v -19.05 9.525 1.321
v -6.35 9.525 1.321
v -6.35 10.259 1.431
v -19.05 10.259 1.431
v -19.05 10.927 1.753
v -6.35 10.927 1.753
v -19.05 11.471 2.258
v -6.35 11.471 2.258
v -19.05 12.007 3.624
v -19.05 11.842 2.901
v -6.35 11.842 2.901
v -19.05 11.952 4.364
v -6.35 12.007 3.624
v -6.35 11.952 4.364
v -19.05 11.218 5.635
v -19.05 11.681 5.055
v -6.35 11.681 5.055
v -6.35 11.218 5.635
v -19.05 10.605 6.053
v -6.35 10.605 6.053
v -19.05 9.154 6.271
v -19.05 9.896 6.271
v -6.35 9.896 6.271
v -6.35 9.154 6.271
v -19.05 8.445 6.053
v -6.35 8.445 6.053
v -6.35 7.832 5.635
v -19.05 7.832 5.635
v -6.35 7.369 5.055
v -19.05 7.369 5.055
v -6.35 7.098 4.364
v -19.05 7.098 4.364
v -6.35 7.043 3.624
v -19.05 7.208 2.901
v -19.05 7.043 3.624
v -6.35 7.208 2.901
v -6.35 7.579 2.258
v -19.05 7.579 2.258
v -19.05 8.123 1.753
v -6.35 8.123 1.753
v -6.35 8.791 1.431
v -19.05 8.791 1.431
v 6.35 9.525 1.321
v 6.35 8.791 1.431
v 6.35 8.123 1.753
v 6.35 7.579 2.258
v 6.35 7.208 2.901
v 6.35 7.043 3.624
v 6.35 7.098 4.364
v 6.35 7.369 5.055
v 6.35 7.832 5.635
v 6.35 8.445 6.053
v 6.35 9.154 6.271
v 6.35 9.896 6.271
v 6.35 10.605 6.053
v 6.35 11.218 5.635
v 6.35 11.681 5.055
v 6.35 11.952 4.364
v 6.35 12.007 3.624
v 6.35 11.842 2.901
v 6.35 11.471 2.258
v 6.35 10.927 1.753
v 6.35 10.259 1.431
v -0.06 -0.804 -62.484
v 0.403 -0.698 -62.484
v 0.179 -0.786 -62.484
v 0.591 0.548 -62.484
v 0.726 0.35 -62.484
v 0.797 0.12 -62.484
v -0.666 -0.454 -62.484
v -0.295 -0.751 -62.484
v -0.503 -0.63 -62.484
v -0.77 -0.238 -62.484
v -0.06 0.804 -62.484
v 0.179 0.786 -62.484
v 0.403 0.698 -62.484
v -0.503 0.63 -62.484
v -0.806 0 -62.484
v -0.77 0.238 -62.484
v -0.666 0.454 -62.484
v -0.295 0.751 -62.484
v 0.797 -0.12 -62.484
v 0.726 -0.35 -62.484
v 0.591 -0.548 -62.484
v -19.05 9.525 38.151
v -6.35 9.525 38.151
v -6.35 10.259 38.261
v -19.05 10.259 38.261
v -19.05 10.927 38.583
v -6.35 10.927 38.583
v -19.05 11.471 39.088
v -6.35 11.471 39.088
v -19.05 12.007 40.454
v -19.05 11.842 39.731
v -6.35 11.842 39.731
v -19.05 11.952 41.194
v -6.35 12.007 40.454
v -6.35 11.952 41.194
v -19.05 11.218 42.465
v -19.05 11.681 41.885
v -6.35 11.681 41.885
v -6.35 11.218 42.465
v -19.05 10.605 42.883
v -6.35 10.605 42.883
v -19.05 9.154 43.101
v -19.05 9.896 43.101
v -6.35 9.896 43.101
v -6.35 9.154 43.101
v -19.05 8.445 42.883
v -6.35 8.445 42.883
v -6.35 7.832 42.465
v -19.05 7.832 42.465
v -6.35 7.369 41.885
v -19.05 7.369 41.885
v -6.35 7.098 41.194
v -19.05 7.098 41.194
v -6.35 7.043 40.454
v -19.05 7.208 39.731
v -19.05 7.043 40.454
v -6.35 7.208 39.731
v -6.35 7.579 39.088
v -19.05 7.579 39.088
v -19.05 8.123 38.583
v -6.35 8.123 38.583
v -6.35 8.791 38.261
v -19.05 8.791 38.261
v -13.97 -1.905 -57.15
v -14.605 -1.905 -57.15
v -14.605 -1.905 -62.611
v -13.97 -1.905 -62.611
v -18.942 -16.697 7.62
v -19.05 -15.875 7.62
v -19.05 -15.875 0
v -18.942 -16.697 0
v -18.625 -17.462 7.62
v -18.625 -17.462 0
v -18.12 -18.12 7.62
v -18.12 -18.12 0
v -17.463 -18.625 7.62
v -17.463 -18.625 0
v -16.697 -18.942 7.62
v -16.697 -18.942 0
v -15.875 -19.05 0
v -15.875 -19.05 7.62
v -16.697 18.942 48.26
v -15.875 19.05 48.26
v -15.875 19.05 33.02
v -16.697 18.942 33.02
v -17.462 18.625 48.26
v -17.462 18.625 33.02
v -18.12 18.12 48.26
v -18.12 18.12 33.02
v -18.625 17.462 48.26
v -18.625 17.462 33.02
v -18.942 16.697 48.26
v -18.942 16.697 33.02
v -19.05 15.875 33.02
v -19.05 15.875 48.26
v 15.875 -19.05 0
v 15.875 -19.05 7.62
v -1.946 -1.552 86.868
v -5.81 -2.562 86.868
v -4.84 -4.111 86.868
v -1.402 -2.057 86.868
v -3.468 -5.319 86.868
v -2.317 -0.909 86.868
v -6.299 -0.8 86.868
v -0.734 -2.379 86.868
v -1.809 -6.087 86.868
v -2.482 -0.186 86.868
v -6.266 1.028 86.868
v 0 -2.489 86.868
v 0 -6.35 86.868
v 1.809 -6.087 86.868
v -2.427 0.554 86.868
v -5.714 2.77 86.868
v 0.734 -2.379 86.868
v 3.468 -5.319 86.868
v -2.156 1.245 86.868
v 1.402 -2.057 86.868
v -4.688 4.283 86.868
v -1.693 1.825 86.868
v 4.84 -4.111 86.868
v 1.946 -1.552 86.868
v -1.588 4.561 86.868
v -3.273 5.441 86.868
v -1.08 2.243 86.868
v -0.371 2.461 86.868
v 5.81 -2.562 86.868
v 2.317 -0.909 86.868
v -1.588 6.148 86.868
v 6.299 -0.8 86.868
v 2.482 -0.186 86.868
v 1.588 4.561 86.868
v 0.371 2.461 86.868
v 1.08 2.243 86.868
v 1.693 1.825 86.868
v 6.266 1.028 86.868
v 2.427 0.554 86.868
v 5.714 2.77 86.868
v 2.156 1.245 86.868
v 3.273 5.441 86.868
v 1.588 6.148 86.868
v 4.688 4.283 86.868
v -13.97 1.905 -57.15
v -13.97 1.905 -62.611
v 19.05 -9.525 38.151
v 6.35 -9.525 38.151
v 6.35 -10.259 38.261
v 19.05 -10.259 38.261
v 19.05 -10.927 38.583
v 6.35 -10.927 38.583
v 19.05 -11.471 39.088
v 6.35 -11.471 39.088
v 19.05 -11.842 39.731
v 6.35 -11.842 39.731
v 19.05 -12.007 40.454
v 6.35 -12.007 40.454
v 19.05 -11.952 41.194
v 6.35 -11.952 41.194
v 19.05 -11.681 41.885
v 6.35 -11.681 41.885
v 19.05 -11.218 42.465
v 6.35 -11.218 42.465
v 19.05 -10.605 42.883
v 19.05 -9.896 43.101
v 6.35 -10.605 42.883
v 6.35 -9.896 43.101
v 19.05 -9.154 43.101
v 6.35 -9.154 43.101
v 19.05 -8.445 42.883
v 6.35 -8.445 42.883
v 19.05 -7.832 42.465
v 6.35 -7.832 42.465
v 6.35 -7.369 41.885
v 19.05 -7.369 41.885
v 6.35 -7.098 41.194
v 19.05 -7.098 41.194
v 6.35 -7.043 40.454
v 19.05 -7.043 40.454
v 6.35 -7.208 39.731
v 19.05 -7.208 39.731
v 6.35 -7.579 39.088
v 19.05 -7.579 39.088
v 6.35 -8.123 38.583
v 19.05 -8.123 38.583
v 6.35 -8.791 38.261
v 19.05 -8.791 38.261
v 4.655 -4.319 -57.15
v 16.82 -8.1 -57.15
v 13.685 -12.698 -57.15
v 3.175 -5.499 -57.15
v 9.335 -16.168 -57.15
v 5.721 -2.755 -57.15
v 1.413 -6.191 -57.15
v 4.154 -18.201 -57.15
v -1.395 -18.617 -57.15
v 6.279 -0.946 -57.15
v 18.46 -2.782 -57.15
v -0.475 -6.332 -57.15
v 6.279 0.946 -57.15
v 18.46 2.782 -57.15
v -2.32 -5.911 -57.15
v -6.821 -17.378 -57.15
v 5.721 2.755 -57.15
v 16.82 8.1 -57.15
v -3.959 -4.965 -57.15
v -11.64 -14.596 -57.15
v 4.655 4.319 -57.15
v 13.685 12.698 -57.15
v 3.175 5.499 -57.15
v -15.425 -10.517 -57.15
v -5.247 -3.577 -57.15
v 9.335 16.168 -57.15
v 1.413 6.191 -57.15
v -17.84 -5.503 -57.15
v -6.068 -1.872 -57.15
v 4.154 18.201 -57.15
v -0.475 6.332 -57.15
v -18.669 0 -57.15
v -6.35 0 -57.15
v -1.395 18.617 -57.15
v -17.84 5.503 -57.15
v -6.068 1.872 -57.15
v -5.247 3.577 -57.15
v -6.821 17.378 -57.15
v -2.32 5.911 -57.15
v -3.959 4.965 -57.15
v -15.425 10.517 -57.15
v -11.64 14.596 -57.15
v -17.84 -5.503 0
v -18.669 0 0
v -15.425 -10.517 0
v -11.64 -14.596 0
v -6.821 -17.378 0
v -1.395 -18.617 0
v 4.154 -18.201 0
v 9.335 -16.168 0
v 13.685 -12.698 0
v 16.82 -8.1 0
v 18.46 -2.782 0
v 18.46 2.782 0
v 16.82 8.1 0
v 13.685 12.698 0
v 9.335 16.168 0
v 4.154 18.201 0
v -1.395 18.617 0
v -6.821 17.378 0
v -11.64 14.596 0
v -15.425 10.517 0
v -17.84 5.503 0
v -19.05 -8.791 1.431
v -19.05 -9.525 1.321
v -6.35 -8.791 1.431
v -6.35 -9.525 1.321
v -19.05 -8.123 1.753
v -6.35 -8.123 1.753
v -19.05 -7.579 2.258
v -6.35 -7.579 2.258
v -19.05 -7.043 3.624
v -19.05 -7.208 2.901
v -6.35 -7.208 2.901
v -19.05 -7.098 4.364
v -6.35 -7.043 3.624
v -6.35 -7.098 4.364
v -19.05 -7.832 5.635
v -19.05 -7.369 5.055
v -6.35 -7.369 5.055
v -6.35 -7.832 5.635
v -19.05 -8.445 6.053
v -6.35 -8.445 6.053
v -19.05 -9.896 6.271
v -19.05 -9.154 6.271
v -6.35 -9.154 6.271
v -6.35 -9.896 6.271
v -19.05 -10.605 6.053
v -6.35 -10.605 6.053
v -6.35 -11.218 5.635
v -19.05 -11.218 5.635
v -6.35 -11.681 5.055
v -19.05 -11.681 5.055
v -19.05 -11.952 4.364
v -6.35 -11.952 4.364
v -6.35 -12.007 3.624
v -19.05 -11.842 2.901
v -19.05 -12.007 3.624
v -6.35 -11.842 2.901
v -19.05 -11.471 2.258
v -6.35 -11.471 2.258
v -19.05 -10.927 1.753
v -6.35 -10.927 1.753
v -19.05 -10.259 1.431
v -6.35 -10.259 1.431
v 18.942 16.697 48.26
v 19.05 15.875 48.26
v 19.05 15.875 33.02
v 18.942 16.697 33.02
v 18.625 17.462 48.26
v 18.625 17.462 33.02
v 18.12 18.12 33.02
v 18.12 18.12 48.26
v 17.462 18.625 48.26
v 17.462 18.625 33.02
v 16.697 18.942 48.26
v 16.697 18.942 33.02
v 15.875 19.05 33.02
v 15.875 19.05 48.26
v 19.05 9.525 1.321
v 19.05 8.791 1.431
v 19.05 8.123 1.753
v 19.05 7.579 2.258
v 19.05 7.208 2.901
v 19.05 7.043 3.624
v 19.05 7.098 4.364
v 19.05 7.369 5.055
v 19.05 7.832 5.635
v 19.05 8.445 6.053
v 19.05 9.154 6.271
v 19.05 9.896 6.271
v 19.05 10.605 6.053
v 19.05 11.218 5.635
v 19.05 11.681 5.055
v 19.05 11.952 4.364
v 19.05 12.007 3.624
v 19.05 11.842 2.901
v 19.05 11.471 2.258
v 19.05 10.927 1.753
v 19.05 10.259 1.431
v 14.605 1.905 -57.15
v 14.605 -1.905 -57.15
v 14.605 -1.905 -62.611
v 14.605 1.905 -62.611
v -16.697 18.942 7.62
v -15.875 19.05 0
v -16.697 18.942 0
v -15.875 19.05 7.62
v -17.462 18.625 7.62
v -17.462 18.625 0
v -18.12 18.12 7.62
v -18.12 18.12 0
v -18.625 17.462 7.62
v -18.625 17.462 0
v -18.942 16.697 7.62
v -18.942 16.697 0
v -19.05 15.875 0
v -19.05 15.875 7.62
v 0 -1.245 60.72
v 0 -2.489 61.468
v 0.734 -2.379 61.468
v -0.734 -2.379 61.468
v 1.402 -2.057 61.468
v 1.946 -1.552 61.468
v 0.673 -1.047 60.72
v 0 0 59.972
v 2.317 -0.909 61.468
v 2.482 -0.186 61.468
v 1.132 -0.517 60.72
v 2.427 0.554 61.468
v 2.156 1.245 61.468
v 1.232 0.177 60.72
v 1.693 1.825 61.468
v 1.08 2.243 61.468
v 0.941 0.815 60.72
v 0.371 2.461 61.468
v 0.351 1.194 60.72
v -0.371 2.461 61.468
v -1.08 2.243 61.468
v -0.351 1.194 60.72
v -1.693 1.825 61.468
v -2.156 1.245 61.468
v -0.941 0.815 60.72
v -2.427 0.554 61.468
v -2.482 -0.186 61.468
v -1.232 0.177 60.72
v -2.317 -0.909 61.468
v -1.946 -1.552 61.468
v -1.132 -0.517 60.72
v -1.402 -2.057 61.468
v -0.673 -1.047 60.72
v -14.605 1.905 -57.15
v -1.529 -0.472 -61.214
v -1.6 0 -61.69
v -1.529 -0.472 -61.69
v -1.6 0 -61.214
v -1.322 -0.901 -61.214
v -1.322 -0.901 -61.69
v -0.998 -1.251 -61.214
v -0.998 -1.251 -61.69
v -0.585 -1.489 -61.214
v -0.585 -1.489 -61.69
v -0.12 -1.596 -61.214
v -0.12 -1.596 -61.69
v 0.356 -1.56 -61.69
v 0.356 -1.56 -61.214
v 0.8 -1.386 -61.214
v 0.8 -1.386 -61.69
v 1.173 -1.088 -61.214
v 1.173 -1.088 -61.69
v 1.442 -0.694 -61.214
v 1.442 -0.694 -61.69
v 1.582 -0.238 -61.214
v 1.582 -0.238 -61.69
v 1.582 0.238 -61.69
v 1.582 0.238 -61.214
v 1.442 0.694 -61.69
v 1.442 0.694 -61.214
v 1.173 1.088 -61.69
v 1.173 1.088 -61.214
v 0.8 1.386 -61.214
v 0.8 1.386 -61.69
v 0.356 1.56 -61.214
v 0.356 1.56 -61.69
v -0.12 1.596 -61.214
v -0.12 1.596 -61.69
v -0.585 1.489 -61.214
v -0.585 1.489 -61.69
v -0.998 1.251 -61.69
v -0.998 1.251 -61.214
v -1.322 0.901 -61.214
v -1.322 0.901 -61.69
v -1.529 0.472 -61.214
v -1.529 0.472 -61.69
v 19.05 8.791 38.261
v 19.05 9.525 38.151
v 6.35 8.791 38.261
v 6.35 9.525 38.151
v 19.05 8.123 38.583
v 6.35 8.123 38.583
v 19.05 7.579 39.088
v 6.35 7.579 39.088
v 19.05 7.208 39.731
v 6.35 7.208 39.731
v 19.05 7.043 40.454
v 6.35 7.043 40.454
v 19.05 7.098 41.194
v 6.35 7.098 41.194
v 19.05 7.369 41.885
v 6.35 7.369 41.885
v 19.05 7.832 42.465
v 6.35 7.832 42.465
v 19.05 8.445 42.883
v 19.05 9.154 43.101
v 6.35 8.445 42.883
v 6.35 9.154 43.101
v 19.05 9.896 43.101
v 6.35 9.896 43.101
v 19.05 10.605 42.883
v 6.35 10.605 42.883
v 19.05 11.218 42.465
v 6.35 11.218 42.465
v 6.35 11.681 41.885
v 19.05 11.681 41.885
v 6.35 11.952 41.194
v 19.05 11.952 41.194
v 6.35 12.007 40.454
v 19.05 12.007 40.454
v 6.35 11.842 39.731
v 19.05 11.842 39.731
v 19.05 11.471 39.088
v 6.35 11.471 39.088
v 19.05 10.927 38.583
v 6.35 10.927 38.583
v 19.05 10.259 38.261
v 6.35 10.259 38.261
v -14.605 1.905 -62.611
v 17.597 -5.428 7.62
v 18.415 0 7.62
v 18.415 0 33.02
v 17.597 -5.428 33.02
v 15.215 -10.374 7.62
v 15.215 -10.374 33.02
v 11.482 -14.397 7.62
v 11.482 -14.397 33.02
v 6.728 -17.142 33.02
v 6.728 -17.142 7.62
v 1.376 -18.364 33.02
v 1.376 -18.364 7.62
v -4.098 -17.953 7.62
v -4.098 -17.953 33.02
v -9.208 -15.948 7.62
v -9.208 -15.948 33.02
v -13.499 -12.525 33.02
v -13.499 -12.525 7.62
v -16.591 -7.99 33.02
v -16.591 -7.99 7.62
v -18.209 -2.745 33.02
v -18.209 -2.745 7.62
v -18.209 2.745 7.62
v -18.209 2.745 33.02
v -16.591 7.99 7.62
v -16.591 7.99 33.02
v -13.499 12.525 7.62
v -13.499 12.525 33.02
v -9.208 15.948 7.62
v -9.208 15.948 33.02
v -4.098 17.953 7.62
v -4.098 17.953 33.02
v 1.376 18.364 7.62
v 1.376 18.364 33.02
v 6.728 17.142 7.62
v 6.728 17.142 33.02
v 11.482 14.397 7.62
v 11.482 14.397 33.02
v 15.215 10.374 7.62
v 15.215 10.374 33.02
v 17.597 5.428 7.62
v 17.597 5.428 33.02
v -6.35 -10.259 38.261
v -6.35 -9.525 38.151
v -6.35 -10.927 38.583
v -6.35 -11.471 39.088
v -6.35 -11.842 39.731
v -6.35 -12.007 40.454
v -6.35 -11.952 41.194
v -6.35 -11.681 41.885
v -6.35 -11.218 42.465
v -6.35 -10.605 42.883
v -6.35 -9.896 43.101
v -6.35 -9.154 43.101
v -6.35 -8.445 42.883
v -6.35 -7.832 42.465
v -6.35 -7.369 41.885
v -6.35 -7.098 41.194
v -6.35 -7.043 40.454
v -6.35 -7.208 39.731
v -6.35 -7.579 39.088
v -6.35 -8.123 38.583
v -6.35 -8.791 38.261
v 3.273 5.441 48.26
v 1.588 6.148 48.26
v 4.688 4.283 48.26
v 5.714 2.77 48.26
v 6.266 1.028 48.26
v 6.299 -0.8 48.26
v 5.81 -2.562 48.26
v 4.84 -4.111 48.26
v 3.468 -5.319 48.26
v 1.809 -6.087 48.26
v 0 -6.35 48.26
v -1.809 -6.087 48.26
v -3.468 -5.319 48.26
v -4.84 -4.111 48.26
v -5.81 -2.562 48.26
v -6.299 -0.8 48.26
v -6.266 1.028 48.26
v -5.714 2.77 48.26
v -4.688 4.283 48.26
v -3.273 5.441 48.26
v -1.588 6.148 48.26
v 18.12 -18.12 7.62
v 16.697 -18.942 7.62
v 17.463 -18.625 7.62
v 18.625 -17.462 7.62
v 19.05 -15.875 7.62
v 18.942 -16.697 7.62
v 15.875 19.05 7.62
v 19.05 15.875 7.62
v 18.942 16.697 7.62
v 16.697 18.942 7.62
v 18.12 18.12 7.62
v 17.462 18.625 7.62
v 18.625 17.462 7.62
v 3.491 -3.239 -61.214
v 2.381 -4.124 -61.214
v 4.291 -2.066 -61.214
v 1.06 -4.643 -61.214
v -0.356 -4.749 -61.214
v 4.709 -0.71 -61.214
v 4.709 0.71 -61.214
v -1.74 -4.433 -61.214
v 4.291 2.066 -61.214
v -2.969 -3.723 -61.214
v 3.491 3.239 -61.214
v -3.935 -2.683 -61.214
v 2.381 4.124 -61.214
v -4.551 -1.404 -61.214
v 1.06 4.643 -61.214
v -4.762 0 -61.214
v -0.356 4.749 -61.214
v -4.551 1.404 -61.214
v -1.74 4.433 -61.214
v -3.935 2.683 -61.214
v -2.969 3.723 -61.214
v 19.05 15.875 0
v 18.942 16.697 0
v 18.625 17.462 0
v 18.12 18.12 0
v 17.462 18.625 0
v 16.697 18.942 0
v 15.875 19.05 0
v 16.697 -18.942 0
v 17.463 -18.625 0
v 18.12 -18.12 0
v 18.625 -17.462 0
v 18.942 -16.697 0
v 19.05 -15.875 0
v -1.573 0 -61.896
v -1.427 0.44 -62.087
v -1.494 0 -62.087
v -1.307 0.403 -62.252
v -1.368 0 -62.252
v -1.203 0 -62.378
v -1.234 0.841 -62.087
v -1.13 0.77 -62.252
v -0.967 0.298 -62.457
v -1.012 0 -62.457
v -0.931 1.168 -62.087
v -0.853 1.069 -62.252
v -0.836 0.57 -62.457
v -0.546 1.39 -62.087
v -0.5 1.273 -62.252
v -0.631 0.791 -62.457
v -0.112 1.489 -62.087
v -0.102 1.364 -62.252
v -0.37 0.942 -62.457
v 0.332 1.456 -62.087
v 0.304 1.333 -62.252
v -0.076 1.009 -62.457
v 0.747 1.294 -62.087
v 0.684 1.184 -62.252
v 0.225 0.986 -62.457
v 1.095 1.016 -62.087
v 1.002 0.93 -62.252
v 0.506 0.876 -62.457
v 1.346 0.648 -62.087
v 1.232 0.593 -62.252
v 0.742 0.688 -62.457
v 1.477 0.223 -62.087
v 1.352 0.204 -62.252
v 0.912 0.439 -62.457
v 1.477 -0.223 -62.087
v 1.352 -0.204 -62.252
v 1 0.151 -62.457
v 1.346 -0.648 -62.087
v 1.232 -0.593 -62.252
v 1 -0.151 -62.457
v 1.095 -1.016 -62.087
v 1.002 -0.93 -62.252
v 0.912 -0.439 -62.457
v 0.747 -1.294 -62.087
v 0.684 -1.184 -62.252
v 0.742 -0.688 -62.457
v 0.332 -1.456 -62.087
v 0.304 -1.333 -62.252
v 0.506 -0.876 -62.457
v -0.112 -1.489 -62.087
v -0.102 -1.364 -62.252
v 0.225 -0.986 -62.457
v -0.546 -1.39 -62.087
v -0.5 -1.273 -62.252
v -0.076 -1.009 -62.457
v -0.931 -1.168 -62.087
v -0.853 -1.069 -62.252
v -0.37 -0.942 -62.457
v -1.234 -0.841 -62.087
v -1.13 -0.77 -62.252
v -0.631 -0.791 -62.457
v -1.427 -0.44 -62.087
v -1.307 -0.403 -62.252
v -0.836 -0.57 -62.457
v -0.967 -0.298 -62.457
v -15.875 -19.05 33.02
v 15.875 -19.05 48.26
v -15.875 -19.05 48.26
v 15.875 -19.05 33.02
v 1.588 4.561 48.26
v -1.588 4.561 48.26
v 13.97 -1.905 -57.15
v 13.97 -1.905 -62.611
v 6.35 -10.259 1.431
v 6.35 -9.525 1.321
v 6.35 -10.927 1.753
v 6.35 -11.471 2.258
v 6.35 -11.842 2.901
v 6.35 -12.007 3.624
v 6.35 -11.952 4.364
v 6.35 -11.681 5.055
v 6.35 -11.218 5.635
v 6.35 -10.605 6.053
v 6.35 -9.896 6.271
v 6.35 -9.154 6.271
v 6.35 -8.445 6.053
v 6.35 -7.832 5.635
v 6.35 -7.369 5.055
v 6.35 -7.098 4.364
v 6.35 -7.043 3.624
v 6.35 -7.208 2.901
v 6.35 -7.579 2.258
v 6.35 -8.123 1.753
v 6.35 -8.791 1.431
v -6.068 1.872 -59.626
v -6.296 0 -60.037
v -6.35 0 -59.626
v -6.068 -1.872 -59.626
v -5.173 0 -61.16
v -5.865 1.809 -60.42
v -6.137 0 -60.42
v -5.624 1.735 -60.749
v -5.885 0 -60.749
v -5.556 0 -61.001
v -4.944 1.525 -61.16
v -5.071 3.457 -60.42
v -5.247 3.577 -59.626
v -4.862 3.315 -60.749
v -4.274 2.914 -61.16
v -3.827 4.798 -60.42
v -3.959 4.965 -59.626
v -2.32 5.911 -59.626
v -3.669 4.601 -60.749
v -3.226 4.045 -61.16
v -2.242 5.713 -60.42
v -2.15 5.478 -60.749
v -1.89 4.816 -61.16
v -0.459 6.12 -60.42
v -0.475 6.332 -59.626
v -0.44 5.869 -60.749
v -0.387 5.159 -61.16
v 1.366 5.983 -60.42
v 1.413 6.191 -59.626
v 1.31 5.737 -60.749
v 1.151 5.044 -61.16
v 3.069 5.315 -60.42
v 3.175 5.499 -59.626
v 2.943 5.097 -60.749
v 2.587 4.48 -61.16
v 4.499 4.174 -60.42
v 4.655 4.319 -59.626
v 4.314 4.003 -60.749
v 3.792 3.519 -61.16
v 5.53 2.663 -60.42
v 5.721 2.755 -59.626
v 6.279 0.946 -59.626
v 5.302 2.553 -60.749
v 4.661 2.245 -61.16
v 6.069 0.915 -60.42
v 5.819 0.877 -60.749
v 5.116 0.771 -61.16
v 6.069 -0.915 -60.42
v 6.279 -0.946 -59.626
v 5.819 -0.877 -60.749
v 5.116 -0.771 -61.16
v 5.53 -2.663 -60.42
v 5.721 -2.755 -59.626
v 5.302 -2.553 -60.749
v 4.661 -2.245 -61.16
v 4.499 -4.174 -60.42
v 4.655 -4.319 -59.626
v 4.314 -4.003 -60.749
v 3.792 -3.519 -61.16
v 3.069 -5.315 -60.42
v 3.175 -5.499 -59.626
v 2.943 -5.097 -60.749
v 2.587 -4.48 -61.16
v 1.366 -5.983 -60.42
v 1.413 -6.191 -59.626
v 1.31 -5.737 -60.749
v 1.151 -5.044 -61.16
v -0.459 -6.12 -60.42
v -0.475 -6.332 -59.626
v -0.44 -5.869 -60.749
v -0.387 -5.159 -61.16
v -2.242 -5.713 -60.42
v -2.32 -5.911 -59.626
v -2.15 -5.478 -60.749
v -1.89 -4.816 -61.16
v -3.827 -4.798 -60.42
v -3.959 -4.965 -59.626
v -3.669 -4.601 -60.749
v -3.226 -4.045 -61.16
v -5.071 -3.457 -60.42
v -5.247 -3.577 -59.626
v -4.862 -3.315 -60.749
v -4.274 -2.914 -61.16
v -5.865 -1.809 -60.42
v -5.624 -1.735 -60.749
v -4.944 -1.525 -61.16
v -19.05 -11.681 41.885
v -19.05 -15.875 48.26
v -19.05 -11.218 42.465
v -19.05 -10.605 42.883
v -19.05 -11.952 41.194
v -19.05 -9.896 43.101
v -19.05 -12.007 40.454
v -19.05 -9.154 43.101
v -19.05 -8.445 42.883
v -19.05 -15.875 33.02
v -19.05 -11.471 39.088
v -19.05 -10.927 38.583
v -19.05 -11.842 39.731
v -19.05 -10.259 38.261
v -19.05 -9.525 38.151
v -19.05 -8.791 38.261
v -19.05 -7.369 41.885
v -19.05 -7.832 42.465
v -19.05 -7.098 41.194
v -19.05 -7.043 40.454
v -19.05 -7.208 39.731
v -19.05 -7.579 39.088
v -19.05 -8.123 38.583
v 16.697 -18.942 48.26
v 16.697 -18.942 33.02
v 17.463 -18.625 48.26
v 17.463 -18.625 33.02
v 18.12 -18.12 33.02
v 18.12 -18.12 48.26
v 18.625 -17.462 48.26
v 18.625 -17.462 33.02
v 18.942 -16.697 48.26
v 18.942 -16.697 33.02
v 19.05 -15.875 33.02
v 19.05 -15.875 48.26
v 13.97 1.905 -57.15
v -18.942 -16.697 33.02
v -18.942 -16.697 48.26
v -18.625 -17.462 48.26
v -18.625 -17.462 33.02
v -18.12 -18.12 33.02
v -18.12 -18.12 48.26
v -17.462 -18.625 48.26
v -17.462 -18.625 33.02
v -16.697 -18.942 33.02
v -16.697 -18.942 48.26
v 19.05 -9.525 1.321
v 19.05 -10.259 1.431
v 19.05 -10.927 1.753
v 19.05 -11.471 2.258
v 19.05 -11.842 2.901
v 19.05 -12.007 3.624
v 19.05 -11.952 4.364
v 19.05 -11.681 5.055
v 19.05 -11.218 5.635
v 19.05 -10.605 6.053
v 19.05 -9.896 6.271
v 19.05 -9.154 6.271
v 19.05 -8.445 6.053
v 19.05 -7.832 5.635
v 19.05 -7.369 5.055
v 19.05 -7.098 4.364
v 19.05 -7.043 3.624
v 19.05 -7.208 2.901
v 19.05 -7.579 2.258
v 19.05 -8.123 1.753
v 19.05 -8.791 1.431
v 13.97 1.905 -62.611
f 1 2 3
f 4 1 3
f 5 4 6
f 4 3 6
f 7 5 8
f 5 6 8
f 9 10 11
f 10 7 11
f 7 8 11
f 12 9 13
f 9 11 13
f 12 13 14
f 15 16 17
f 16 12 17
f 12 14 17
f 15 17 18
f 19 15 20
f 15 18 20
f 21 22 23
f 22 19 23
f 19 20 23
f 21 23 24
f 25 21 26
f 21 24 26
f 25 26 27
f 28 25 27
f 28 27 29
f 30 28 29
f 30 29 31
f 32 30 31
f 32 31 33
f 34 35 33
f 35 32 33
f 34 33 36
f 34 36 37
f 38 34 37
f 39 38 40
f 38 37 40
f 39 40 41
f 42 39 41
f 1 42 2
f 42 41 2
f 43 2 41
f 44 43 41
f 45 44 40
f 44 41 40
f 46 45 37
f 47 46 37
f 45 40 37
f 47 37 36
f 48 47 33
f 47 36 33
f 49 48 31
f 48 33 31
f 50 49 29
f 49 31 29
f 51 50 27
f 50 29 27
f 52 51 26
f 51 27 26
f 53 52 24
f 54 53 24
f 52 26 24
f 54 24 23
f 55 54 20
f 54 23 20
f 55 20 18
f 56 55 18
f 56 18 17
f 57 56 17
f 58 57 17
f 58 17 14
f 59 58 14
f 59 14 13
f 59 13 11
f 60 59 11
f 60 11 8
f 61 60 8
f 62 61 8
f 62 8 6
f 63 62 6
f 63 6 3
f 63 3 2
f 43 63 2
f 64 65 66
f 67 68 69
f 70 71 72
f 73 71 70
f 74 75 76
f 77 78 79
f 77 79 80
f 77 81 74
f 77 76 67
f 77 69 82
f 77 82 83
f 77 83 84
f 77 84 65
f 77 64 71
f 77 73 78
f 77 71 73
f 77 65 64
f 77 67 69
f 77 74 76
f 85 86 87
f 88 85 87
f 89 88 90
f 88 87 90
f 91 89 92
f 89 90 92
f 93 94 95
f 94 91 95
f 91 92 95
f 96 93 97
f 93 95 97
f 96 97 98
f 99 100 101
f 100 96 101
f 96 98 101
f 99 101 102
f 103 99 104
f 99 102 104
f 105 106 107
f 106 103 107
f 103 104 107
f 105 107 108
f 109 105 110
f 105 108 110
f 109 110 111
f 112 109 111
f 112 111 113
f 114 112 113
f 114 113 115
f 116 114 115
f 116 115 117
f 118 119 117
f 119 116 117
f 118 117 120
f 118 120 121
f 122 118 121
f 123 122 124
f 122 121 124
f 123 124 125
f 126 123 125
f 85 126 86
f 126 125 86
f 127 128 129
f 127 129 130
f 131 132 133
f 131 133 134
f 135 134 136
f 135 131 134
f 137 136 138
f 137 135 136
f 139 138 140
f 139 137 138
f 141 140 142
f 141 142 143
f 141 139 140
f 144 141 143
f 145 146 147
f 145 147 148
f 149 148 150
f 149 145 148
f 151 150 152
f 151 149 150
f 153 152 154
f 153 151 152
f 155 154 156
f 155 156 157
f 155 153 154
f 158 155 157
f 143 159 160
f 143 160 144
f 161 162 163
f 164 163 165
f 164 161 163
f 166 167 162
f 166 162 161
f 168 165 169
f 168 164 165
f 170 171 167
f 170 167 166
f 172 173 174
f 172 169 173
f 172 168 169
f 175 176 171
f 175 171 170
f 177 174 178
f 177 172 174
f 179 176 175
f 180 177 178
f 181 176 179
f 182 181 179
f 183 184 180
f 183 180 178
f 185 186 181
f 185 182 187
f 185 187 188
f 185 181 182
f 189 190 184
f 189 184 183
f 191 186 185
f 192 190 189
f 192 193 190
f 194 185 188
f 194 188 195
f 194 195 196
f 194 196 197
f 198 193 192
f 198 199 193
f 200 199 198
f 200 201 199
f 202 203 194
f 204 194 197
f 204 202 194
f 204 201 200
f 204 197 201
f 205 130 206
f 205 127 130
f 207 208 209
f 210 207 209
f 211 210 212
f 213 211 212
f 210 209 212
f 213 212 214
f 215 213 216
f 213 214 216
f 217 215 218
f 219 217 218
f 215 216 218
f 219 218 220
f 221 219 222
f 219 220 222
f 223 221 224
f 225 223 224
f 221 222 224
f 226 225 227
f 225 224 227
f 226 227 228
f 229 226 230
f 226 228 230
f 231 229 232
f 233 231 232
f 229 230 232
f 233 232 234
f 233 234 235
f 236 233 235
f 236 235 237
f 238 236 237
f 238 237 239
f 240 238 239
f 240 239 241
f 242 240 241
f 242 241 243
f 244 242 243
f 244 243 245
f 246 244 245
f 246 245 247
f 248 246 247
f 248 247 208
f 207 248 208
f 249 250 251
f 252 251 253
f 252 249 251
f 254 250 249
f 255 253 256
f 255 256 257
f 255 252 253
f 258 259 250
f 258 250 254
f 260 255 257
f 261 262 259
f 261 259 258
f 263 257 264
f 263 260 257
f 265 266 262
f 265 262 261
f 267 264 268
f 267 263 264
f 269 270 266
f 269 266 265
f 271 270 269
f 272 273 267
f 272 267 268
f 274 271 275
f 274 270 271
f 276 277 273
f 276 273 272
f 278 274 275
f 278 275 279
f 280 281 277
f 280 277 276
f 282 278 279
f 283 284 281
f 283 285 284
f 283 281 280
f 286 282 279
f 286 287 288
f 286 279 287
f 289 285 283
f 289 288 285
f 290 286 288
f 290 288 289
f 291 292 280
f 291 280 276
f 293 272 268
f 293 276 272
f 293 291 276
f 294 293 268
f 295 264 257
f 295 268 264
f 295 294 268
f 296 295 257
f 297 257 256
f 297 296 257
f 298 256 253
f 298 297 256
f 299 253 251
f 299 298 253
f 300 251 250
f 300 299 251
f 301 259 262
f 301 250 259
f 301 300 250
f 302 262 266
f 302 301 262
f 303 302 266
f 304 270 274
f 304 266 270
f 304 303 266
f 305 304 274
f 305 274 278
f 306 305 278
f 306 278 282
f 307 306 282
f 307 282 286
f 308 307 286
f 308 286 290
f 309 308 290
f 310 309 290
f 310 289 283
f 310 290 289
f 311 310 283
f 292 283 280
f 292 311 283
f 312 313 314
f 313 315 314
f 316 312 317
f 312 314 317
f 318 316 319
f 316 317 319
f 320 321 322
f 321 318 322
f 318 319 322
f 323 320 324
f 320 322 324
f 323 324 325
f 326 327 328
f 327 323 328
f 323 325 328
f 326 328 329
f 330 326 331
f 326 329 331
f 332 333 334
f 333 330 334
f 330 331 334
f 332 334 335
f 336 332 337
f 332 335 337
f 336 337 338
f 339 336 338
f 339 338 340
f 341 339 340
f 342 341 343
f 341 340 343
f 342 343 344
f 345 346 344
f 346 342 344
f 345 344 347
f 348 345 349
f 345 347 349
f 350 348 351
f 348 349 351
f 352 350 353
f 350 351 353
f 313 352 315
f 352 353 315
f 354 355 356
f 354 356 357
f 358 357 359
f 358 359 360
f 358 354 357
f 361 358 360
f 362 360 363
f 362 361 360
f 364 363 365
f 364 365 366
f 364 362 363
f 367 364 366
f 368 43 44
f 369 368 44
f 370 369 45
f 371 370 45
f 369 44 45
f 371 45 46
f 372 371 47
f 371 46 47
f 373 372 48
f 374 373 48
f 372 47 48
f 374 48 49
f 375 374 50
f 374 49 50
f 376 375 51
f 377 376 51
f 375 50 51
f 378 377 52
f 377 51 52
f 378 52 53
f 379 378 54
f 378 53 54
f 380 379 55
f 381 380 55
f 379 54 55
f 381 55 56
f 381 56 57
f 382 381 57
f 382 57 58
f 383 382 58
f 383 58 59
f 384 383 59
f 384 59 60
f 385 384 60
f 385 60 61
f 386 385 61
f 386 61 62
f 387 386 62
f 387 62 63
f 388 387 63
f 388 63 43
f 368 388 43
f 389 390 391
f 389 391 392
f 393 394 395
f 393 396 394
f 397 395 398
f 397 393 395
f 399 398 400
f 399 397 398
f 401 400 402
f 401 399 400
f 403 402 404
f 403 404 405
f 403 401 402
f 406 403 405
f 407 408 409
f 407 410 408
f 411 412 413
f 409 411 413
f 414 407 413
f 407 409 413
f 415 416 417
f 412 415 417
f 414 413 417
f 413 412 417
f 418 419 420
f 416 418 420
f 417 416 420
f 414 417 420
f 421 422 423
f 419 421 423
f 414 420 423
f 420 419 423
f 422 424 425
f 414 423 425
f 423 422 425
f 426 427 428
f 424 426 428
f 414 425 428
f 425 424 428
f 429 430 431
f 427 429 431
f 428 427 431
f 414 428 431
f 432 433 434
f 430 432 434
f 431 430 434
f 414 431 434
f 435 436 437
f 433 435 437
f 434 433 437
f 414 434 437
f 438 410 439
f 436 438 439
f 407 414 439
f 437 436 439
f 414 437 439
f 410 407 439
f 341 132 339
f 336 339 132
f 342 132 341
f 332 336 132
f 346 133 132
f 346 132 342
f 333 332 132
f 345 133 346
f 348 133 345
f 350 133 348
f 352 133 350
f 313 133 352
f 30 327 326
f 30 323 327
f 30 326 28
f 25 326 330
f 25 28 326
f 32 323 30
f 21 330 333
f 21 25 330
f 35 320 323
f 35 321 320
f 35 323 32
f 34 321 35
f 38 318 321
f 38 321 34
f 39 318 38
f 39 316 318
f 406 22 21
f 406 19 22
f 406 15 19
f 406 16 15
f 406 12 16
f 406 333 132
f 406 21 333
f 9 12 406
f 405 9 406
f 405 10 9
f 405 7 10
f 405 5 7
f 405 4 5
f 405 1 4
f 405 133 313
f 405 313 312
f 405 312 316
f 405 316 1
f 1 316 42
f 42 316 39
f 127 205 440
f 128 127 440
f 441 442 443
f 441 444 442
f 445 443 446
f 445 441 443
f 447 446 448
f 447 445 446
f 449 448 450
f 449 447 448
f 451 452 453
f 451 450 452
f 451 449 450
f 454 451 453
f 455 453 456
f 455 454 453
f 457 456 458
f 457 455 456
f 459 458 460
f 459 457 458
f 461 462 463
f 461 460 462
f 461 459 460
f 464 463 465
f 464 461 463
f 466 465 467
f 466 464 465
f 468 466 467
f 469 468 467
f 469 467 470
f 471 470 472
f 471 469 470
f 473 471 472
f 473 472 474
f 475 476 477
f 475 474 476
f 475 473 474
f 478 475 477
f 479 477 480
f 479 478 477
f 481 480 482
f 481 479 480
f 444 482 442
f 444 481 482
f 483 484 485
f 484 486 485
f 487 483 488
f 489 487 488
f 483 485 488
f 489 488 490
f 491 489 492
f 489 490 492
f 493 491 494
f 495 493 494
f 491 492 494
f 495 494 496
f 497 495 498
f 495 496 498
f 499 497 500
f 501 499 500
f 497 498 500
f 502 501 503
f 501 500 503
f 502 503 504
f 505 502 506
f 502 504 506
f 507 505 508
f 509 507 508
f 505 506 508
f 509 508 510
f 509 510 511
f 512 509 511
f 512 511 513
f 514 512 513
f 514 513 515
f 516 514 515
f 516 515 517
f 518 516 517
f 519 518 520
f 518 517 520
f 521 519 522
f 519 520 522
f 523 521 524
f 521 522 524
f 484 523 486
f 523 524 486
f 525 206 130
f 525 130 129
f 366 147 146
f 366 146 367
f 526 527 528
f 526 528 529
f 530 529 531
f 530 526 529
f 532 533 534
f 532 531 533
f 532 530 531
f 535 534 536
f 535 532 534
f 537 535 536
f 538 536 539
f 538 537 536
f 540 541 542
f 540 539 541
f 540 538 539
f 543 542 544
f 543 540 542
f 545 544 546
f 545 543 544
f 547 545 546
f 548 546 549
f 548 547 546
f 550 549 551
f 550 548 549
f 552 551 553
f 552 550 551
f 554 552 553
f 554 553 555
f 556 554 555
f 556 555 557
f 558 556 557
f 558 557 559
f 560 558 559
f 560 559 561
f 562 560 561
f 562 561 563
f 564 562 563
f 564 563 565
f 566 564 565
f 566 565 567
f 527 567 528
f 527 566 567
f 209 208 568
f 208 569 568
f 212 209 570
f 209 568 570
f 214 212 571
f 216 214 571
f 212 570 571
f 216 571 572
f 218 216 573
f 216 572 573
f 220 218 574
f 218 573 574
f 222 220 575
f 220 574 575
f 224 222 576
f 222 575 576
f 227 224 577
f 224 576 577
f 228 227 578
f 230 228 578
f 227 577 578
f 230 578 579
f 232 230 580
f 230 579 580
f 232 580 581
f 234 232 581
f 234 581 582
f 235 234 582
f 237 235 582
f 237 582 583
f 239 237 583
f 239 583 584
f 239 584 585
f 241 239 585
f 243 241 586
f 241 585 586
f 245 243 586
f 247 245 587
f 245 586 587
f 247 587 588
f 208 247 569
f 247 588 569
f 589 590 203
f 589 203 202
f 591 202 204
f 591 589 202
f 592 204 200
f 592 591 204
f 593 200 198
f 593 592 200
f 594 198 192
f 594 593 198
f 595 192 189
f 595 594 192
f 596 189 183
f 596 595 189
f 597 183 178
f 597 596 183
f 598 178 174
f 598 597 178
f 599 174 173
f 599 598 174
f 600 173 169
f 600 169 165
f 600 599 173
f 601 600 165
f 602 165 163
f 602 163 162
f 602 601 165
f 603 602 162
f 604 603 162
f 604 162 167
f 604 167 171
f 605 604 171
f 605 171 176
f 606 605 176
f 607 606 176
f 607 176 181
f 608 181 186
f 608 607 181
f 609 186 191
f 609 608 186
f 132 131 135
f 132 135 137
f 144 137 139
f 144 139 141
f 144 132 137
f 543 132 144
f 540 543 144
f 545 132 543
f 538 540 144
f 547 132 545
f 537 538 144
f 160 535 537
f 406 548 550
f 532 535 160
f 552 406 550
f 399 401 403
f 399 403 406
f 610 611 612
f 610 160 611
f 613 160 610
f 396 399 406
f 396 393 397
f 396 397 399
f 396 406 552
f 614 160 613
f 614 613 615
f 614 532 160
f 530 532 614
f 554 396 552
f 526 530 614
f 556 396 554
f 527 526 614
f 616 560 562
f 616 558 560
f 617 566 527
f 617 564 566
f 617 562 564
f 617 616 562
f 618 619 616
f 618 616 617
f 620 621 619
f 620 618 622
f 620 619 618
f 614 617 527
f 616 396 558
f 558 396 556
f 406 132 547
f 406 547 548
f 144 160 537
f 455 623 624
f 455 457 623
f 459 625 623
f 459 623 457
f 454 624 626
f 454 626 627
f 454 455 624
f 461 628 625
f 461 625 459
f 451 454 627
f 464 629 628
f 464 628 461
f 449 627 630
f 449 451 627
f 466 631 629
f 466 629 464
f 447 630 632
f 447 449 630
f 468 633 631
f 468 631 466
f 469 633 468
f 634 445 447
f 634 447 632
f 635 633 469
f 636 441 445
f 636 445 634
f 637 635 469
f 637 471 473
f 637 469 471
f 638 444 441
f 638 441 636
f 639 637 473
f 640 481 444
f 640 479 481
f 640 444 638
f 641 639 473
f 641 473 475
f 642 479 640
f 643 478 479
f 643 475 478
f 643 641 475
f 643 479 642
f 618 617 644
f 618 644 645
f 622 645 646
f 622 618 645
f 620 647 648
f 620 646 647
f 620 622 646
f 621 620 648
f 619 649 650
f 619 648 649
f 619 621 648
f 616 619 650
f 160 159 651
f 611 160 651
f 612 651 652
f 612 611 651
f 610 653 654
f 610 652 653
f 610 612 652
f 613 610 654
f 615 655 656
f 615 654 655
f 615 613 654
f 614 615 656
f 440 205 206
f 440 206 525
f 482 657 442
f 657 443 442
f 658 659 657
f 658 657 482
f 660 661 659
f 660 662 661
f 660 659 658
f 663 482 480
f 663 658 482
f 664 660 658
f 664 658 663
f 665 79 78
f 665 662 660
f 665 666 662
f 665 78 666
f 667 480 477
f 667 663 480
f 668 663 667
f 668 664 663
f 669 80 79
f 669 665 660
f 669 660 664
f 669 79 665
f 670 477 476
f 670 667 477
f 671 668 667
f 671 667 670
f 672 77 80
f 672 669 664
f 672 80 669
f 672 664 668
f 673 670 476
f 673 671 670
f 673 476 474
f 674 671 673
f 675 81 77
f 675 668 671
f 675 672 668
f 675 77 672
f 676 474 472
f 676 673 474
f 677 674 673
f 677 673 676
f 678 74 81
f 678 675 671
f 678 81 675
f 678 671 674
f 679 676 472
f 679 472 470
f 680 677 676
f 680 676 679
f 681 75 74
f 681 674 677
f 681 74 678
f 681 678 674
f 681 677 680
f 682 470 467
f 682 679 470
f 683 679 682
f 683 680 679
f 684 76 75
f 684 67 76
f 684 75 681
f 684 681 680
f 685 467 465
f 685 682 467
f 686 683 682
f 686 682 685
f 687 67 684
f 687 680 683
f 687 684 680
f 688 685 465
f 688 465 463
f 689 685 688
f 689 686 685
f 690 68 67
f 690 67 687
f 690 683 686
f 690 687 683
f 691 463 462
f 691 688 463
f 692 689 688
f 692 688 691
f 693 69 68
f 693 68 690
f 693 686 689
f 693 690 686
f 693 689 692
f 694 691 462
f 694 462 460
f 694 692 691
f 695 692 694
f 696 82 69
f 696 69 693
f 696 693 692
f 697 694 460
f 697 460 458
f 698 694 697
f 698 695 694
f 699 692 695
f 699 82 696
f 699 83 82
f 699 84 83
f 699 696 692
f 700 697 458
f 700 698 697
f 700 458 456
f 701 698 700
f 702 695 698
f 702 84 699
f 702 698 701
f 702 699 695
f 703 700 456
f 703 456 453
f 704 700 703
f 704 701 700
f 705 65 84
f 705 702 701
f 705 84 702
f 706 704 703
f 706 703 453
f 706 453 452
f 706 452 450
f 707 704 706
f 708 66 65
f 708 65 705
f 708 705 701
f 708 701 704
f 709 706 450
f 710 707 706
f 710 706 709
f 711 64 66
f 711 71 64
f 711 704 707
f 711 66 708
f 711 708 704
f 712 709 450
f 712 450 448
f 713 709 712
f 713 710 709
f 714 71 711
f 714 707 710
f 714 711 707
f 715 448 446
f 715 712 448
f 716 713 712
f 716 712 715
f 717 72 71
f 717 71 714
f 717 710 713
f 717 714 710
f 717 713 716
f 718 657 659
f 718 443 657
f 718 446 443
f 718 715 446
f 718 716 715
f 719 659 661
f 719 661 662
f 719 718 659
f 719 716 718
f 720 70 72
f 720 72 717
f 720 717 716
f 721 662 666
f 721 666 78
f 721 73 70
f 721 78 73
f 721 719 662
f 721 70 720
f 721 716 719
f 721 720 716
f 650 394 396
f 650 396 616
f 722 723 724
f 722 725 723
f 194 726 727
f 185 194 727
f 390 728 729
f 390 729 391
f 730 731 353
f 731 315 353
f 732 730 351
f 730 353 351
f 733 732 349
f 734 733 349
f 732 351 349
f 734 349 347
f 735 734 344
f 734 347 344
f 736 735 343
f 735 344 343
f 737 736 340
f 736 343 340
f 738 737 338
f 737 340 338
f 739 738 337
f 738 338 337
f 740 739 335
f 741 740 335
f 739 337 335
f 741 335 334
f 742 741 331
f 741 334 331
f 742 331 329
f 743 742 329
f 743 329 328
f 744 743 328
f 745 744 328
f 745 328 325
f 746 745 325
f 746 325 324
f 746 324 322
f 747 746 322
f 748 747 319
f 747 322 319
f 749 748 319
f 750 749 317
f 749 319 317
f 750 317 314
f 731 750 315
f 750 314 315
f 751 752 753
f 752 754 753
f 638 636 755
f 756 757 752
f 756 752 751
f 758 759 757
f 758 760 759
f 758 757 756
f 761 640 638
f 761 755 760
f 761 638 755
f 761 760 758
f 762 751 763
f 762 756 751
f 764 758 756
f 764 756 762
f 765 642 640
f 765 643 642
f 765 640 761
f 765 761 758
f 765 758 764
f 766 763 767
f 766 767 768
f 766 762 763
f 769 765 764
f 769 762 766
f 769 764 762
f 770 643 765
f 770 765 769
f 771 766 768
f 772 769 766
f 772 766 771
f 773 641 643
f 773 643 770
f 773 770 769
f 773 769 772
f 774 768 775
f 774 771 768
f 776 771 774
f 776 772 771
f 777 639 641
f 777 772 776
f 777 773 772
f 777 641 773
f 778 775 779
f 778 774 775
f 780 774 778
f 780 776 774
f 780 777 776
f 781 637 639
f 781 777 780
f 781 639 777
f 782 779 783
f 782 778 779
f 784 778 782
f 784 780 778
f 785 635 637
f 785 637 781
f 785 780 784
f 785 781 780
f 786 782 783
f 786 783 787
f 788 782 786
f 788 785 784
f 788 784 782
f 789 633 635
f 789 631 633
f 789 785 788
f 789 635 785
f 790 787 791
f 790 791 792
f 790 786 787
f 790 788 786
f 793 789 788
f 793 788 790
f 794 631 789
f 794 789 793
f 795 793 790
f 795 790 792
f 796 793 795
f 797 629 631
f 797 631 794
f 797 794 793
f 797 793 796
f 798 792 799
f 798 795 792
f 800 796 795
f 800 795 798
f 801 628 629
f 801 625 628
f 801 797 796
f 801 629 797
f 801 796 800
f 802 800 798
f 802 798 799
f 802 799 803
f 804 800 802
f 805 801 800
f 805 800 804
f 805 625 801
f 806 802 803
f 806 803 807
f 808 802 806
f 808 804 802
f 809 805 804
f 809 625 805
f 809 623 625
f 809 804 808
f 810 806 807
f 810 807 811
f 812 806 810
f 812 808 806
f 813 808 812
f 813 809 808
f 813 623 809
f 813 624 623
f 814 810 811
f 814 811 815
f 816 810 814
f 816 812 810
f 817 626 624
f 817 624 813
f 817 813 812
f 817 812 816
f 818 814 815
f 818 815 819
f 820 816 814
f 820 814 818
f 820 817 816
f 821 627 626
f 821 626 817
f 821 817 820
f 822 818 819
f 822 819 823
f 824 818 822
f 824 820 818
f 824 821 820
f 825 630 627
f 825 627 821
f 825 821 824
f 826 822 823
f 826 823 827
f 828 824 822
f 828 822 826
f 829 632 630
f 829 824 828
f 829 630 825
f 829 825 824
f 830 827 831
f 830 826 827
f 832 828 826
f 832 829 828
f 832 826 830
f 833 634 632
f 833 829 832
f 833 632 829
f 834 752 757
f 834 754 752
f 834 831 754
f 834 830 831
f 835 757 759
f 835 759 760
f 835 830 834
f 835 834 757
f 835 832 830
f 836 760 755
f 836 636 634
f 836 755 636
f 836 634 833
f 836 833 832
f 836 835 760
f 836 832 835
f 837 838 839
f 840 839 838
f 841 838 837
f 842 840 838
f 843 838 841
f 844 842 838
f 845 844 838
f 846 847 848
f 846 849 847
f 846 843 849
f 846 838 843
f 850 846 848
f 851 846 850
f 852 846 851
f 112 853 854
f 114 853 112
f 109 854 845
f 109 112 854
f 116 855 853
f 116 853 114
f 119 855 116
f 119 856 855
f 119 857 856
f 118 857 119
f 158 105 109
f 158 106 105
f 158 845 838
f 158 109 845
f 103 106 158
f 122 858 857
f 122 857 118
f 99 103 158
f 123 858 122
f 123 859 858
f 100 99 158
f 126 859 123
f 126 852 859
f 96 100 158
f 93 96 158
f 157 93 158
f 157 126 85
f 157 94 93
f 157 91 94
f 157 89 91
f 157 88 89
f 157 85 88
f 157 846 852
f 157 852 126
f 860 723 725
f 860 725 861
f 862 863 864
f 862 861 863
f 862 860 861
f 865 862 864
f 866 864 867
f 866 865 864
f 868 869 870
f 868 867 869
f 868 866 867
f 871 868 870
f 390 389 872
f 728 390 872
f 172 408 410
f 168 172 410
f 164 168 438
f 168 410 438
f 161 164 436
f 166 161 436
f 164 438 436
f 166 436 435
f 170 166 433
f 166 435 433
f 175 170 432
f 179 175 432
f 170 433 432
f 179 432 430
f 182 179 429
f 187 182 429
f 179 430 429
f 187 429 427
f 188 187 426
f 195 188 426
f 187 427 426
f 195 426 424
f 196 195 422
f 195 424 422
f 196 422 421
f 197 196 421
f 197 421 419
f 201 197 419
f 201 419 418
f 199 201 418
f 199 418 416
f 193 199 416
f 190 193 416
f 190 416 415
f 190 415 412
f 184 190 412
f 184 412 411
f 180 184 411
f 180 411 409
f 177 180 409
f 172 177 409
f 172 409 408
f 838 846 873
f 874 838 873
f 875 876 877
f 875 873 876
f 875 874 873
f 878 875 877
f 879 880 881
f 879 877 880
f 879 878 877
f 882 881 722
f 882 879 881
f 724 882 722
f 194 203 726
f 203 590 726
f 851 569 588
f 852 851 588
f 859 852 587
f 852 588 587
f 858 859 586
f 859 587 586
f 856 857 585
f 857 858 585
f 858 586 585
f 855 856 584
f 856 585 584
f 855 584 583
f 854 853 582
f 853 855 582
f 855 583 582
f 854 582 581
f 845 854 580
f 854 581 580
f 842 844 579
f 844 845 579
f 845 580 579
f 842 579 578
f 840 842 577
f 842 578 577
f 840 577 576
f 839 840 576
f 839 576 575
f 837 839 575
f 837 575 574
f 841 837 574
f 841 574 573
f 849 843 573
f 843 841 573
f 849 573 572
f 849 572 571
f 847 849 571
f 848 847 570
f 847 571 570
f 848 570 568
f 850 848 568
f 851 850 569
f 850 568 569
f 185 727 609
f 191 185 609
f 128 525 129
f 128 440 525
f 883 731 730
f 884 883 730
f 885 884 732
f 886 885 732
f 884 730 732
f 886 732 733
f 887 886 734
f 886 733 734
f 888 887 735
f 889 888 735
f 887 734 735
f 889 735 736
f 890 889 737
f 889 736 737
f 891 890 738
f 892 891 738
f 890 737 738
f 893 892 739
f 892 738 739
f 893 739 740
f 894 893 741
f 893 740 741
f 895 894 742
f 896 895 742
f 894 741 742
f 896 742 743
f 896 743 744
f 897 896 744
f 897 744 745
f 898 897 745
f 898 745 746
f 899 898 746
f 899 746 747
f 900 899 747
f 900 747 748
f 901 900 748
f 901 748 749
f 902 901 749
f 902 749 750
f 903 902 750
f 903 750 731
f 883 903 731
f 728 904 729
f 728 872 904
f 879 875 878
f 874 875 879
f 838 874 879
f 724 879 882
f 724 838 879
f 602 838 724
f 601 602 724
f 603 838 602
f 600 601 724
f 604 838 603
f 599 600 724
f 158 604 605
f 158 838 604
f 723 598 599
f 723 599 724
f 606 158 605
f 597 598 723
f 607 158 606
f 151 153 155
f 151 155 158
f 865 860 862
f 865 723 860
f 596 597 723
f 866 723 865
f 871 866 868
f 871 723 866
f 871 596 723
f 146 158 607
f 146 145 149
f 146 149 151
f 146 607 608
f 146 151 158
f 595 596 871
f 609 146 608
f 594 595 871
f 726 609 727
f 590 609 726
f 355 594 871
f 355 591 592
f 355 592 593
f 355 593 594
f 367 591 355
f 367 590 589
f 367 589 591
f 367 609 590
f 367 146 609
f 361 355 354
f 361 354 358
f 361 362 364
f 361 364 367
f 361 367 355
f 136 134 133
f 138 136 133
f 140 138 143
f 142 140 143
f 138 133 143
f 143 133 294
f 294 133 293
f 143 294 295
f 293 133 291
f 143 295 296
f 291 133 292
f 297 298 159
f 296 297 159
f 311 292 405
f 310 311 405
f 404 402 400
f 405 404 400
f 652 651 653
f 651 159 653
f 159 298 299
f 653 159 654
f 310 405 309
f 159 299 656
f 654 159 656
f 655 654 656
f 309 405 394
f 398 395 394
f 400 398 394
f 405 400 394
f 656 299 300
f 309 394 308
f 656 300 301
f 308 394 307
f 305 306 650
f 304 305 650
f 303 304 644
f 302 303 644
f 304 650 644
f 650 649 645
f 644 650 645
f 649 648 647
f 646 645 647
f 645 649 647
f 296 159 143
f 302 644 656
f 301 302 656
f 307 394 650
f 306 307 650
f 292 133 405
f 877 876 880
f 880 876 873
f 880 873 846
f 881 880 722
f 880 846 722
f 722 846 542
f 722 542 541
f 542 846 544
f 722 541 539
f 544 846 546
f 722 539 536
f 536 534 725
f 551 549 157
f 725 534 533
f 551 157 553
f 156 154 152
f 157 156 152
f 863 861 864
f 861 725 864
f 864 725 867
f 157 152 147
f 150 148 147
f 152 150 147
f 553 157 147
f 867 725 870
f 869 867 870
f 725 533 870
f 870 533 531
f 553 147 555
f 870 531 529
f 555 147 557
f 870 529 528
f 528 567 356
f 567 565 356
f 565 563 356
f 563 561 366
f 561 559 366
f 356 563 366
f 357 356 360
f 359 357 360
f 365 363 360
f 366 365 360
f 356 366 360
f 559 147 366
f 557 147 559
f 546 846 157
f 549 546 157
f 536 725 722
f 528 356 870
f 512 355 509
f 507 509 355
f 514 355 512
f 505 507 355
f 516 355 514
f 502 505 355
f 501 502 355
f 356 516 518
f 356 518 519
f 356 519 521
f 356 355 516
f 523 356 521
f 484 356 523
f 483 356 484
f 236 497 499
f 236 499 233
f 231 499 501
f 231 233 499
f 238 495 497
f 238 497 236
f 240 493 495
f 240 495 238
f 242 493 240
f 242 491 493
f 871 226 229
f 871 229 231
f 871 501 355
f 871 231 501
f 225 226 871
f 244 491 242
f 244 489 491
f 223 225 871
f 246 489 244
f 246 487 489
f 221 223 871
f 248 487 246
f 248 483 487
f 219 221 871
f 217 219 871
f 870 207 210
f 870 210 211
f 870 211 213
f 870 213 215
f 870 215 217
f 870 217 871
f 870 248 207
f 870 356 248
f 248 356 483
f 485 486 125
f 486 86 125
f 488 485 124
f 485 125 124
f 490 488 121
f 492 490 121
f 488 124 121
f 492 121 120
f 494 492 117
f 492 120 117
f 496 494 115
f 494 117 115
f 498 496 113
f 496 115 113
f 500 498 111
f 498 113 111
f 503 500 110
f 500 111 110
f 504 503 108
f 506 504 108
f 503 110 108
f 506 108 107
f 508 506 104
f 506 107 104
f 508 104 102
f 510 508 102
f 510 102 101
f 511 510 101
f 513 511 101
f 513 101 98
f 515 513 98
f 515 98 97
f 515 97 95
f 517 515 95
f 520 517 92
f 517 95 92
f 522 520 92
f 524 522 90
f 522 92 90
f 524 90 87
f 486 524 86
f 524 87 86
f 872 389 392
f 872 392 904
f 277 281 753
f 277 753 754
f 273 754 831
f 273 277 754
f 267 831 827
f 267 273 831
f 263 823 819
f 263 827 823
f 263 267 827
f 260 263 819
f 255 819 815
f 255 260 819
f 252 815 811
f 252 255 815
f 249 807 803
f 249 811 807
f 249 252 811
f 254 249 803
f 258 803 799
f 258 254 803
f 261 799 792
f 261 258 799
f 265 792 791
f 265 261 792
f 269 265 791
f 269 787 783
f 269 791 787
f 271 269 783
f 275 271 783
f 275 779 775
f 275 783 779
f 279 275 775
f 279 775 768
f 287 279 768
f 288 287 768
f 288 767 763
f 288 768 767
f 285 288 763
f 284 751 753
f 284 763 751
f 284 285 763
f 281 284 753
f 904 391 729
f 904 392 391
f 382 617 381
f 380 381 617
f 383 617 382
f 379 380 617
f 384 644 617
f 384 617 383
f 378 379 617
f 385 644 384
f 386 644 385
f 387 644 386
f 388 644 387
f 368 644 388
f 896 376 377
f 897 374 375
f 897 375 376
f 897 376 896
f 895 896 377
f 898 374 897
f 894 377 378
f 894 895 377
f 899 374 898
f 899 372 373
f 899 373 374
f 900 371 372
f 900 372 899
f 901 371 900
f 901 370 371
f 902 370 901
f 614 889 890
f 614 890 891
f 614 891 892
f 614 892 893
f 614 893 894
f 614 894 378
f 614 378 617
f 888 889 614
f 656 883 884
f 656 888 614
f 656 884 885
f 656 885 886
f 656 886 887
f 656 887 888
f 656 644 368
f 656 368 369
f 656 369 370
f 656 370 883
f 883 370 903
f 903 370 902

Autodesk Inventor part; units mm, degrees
ref_plane "YZ Plane" through (0, 0, 0) normal (1, 0, 0) x (0, 1, 0)
ref_plane "XZ Plane" through (0, 0, 0) normal (0, 1, 0) x (-1, 0, 0)
sketch "Sketch3" plane through (0, 0, 0) normal (0, 0, 1) x (1, 0, 0)
  line L0 (-19.05, 19.05) -> (19.05, 19.05)
  line L1 (19.05, 19.05) -> (19.05, -19.05)
  line L2 (19.05, -19.05) -> (-19.05, -19.05)
  line L3 (-19.05, -19.05) -> (-19.05, 19.05)
  point P0 (0, 0)
  point P1 (-19.05, 0)
  point P2 (0, 19.05)
  dimension "d4" = 38.1
  dimension "d5" = 38.1
extrude "Extrusion2" add sketch "Sketch3" along normal blind 7.62
sketch "Sketch4" plane through (0, 0, 7.62) normal (0, 0, 1) x (1, 0, 0)
  circle A0 centre (0, 0) radius 18.415
  dimension "d8" = 36.83
extrude "Extrusion3" add sketch "Sketch4" along normal blind 25.4
sketch "Sketch5" plane through (0, 0, 33.02) normal (0, 0, 1) x (1, 0, 0)
  circle A0 centre (0, 0) radius 18.415 projected
  line L0 (19.05, 19.05) -> (19.05, -19.05) projected
  line L1 (-19.05, 19.05) -> (19.05, 19.05) projected
  line L2 (-19.05, -19.05) -> (-19.05, 19.05) projected
  line L3 (19.05, -19.05) -> (-19.05, -19.05) projected
extrude "Extrusion4" add sketch "Sketch5" along normal blind 15.24 contours A0 | L0 L3 L2 L1
sketch "Sketch6" plane through (0, 0, 48.26) normal (0, 0, 1) x (1, 0, 0)
  circle A0 centre (0, 0) radius 6.35
  line L0 (-1.5875, 7.7359) -> (1.5875, 7.7359)
  line L1 (1.5875, 7.7359) -> (1.5875, 4.5609)
  line L2 (1.5875, 4.5609) -> (-1.5875, 4.5609)
  line L3 (-1.5875, 4.5609) -> (-1.5875, 7.7359)
  line L4 (-1.5875, 6.1484) -> (1.5875, 6.1484) construction
  point P0 (0, 0)
  point P1 (0, 4.5609)
  dimension "d13" = 12.7
  dimension "d14" = 3.175
  dimension "d16" = 1.5875
extrude "Extrusion5" add sketch "Sketch6" along normal blind 38.608 contours A0 L3 L2 L1 picked at (0.1781, 0.9314)
sketch "Sketch7" plane through (19.05, -19.05, 33.02) normal (1, 0, 0) x (0, 0, -1)
  line L0 (0, 0) -> (-15.24, 0) projected
  line L1 (0, 38.1) -> (-15.24, 38.1) projected
  line L2 (25.4, 38.1) -> (25.4, 0) projected
  line L3 (33.02, 0) -> (25.4, 0) projected
  line L4 (33.02, 38.1) -> (33.02, 0) projected
  line L5 (33.02, 38.1) -> (25.4, 38.1) projected
  point P0 (33.02, 19.05)
  point P1 (-7.62, 28.575)
  point P2 (-7.62, 9.525)
  point P3 (-7.62, 38.1)
  point P4 (-7.62, 0)
  point P5 (29.21, 28.575)
  point P6 (29.21, 9.525)
  point P7 (29.21, 38.1)
  point P8 (29.21, 0)
  dimension "d19" = 9.525
  dimension "d20" = 9.525
hole "Hole1" at (19.05, 9.525, 40.64) at (19.05, -9.525, 40.64) at (19.05, 9.525, 3.81) at (19.05, -9.525, 3.81) direction (-1, 0, 0) diameter 4.9784 depth 25.4 tip angle 118 thread size "1/4-20 UNC" class "2B" standard "ANSI Unified Screw Threads"
ref_plane "Work Plane1" through (0, -19.05, 33.02) normal (1, 0, 0) x (0, 0, -1)
mirror "Mirror1" about plane through (0, -19.05, 33.02) normal (1, 0, 0) of "Hole1"
sketch "Sketch8" plane through (0, 0, 86.868) normal (0, 0, 1) x (1, 0, 0)
  arc A0 (-1.5875, 6.1484) -> (1.5875, 6.1484) centre (0, 0) ccw projected
hole "Hole2" at (0, 0, 86.868) direction (0, 0, -1) diameter 4.9784 depth 25.4 tip angle 118 thread size "1/4-20 UNC" class "2B" standard "ANSI Unified Screw Threads"
sketch "Sketch9" plane through (0, 0, 0) normal (0, 0, -1) x (-1, 0, 0)
  circle A0 centre (0, 0) radius 18.669
  dimension "d35" = 37.338
extrude "Extrusion6" add sketch "Sketch9" along normal blind 57.15
sketch "Sketch10" plane through (0, 0, -57.15) normal (0, 0, -1) x (-1, 0, 0)
  circle A0 centre (0, 0) radius 18.669 projected
  line L0 (-14.605, 1.905) -> (-13.97, 1.905)
  line L1 (-13.97, 1.905) -> (-13.97, -1.905)
  line L2 (-13.97, -1.905) -> (-14.605, -1.905)
  line L3 (-14.605, -1.905) -> (-14.605, 1.905)
  line L4 (13.97, 1.905) -> (14.605, 1.905)
  line L5 (14.605, 1.905) -> (14.605, -1.905)
  line L6 (14.605, -1.905) -> (13.97, -1.905)
  line L7 (13.97, -1.905) -> (13.97, 1.905)
  point P0 (-13.97, 0)
  point P1 (13.97, 0)
  dimension "d38" = 3.81
  dimension "d39" = 0.635
  dimension "d40" = 13.97
  dimension "d41" = 13.97
extrude "Extrusion7" add sketch "Sketch10" along normal blind 5.461 separate body contours L0 L1 L2 L3 | L4 L5 L6 L7
sketch "Sketch11" plane through (0, 0, -57.15) normal (0, 0, -1) x (-1, 0, 0)
  circle A0 centre (0, 0) radius 18.669 projected
  circle A1 centre (0, 0) radius 6.35
  dimension "d44" = 12.7
extrude "Extrusion8" add sketch "Sketch11" along normal blind 4.064 contours A1 bodies 1
sketch "Sketch12" plane through (0, 0, -61.214) normal (0, 0, -1) x (-1, 0, 0)
  circle A0 centre (0, 0) radius 6.35 projected
  circle A1 centre (0, 0) radius 1.6
  dimension "d47" = 3.2
extrude "Extrusion9" add sketch "Sketch12" along normal blind 1.27 contours A1 bodies 1
fillet "Fillet1" radius 1.5875 1 edges at (6.35, 0, -61.214)
fillet "Fillet2" radius 0.7937 1 edges at (1.6, 0, -62.484)
fillet "Fillet3" radius 3.175 8 edges at (-19.05, 19.05, 3.81) (-19.05, 19.05, 40.64) (-19.05, -19.05, 40.64) (-19.05, -19.05, 3.81) (19.05, 19.05, 3.81) (19.05, 19.05, 40.64) (19.05, -19.05, 3.81) (19.05, -19.05, 40.64)
properties part number "Banebot P60 20to1 with RS-550 Motor"
